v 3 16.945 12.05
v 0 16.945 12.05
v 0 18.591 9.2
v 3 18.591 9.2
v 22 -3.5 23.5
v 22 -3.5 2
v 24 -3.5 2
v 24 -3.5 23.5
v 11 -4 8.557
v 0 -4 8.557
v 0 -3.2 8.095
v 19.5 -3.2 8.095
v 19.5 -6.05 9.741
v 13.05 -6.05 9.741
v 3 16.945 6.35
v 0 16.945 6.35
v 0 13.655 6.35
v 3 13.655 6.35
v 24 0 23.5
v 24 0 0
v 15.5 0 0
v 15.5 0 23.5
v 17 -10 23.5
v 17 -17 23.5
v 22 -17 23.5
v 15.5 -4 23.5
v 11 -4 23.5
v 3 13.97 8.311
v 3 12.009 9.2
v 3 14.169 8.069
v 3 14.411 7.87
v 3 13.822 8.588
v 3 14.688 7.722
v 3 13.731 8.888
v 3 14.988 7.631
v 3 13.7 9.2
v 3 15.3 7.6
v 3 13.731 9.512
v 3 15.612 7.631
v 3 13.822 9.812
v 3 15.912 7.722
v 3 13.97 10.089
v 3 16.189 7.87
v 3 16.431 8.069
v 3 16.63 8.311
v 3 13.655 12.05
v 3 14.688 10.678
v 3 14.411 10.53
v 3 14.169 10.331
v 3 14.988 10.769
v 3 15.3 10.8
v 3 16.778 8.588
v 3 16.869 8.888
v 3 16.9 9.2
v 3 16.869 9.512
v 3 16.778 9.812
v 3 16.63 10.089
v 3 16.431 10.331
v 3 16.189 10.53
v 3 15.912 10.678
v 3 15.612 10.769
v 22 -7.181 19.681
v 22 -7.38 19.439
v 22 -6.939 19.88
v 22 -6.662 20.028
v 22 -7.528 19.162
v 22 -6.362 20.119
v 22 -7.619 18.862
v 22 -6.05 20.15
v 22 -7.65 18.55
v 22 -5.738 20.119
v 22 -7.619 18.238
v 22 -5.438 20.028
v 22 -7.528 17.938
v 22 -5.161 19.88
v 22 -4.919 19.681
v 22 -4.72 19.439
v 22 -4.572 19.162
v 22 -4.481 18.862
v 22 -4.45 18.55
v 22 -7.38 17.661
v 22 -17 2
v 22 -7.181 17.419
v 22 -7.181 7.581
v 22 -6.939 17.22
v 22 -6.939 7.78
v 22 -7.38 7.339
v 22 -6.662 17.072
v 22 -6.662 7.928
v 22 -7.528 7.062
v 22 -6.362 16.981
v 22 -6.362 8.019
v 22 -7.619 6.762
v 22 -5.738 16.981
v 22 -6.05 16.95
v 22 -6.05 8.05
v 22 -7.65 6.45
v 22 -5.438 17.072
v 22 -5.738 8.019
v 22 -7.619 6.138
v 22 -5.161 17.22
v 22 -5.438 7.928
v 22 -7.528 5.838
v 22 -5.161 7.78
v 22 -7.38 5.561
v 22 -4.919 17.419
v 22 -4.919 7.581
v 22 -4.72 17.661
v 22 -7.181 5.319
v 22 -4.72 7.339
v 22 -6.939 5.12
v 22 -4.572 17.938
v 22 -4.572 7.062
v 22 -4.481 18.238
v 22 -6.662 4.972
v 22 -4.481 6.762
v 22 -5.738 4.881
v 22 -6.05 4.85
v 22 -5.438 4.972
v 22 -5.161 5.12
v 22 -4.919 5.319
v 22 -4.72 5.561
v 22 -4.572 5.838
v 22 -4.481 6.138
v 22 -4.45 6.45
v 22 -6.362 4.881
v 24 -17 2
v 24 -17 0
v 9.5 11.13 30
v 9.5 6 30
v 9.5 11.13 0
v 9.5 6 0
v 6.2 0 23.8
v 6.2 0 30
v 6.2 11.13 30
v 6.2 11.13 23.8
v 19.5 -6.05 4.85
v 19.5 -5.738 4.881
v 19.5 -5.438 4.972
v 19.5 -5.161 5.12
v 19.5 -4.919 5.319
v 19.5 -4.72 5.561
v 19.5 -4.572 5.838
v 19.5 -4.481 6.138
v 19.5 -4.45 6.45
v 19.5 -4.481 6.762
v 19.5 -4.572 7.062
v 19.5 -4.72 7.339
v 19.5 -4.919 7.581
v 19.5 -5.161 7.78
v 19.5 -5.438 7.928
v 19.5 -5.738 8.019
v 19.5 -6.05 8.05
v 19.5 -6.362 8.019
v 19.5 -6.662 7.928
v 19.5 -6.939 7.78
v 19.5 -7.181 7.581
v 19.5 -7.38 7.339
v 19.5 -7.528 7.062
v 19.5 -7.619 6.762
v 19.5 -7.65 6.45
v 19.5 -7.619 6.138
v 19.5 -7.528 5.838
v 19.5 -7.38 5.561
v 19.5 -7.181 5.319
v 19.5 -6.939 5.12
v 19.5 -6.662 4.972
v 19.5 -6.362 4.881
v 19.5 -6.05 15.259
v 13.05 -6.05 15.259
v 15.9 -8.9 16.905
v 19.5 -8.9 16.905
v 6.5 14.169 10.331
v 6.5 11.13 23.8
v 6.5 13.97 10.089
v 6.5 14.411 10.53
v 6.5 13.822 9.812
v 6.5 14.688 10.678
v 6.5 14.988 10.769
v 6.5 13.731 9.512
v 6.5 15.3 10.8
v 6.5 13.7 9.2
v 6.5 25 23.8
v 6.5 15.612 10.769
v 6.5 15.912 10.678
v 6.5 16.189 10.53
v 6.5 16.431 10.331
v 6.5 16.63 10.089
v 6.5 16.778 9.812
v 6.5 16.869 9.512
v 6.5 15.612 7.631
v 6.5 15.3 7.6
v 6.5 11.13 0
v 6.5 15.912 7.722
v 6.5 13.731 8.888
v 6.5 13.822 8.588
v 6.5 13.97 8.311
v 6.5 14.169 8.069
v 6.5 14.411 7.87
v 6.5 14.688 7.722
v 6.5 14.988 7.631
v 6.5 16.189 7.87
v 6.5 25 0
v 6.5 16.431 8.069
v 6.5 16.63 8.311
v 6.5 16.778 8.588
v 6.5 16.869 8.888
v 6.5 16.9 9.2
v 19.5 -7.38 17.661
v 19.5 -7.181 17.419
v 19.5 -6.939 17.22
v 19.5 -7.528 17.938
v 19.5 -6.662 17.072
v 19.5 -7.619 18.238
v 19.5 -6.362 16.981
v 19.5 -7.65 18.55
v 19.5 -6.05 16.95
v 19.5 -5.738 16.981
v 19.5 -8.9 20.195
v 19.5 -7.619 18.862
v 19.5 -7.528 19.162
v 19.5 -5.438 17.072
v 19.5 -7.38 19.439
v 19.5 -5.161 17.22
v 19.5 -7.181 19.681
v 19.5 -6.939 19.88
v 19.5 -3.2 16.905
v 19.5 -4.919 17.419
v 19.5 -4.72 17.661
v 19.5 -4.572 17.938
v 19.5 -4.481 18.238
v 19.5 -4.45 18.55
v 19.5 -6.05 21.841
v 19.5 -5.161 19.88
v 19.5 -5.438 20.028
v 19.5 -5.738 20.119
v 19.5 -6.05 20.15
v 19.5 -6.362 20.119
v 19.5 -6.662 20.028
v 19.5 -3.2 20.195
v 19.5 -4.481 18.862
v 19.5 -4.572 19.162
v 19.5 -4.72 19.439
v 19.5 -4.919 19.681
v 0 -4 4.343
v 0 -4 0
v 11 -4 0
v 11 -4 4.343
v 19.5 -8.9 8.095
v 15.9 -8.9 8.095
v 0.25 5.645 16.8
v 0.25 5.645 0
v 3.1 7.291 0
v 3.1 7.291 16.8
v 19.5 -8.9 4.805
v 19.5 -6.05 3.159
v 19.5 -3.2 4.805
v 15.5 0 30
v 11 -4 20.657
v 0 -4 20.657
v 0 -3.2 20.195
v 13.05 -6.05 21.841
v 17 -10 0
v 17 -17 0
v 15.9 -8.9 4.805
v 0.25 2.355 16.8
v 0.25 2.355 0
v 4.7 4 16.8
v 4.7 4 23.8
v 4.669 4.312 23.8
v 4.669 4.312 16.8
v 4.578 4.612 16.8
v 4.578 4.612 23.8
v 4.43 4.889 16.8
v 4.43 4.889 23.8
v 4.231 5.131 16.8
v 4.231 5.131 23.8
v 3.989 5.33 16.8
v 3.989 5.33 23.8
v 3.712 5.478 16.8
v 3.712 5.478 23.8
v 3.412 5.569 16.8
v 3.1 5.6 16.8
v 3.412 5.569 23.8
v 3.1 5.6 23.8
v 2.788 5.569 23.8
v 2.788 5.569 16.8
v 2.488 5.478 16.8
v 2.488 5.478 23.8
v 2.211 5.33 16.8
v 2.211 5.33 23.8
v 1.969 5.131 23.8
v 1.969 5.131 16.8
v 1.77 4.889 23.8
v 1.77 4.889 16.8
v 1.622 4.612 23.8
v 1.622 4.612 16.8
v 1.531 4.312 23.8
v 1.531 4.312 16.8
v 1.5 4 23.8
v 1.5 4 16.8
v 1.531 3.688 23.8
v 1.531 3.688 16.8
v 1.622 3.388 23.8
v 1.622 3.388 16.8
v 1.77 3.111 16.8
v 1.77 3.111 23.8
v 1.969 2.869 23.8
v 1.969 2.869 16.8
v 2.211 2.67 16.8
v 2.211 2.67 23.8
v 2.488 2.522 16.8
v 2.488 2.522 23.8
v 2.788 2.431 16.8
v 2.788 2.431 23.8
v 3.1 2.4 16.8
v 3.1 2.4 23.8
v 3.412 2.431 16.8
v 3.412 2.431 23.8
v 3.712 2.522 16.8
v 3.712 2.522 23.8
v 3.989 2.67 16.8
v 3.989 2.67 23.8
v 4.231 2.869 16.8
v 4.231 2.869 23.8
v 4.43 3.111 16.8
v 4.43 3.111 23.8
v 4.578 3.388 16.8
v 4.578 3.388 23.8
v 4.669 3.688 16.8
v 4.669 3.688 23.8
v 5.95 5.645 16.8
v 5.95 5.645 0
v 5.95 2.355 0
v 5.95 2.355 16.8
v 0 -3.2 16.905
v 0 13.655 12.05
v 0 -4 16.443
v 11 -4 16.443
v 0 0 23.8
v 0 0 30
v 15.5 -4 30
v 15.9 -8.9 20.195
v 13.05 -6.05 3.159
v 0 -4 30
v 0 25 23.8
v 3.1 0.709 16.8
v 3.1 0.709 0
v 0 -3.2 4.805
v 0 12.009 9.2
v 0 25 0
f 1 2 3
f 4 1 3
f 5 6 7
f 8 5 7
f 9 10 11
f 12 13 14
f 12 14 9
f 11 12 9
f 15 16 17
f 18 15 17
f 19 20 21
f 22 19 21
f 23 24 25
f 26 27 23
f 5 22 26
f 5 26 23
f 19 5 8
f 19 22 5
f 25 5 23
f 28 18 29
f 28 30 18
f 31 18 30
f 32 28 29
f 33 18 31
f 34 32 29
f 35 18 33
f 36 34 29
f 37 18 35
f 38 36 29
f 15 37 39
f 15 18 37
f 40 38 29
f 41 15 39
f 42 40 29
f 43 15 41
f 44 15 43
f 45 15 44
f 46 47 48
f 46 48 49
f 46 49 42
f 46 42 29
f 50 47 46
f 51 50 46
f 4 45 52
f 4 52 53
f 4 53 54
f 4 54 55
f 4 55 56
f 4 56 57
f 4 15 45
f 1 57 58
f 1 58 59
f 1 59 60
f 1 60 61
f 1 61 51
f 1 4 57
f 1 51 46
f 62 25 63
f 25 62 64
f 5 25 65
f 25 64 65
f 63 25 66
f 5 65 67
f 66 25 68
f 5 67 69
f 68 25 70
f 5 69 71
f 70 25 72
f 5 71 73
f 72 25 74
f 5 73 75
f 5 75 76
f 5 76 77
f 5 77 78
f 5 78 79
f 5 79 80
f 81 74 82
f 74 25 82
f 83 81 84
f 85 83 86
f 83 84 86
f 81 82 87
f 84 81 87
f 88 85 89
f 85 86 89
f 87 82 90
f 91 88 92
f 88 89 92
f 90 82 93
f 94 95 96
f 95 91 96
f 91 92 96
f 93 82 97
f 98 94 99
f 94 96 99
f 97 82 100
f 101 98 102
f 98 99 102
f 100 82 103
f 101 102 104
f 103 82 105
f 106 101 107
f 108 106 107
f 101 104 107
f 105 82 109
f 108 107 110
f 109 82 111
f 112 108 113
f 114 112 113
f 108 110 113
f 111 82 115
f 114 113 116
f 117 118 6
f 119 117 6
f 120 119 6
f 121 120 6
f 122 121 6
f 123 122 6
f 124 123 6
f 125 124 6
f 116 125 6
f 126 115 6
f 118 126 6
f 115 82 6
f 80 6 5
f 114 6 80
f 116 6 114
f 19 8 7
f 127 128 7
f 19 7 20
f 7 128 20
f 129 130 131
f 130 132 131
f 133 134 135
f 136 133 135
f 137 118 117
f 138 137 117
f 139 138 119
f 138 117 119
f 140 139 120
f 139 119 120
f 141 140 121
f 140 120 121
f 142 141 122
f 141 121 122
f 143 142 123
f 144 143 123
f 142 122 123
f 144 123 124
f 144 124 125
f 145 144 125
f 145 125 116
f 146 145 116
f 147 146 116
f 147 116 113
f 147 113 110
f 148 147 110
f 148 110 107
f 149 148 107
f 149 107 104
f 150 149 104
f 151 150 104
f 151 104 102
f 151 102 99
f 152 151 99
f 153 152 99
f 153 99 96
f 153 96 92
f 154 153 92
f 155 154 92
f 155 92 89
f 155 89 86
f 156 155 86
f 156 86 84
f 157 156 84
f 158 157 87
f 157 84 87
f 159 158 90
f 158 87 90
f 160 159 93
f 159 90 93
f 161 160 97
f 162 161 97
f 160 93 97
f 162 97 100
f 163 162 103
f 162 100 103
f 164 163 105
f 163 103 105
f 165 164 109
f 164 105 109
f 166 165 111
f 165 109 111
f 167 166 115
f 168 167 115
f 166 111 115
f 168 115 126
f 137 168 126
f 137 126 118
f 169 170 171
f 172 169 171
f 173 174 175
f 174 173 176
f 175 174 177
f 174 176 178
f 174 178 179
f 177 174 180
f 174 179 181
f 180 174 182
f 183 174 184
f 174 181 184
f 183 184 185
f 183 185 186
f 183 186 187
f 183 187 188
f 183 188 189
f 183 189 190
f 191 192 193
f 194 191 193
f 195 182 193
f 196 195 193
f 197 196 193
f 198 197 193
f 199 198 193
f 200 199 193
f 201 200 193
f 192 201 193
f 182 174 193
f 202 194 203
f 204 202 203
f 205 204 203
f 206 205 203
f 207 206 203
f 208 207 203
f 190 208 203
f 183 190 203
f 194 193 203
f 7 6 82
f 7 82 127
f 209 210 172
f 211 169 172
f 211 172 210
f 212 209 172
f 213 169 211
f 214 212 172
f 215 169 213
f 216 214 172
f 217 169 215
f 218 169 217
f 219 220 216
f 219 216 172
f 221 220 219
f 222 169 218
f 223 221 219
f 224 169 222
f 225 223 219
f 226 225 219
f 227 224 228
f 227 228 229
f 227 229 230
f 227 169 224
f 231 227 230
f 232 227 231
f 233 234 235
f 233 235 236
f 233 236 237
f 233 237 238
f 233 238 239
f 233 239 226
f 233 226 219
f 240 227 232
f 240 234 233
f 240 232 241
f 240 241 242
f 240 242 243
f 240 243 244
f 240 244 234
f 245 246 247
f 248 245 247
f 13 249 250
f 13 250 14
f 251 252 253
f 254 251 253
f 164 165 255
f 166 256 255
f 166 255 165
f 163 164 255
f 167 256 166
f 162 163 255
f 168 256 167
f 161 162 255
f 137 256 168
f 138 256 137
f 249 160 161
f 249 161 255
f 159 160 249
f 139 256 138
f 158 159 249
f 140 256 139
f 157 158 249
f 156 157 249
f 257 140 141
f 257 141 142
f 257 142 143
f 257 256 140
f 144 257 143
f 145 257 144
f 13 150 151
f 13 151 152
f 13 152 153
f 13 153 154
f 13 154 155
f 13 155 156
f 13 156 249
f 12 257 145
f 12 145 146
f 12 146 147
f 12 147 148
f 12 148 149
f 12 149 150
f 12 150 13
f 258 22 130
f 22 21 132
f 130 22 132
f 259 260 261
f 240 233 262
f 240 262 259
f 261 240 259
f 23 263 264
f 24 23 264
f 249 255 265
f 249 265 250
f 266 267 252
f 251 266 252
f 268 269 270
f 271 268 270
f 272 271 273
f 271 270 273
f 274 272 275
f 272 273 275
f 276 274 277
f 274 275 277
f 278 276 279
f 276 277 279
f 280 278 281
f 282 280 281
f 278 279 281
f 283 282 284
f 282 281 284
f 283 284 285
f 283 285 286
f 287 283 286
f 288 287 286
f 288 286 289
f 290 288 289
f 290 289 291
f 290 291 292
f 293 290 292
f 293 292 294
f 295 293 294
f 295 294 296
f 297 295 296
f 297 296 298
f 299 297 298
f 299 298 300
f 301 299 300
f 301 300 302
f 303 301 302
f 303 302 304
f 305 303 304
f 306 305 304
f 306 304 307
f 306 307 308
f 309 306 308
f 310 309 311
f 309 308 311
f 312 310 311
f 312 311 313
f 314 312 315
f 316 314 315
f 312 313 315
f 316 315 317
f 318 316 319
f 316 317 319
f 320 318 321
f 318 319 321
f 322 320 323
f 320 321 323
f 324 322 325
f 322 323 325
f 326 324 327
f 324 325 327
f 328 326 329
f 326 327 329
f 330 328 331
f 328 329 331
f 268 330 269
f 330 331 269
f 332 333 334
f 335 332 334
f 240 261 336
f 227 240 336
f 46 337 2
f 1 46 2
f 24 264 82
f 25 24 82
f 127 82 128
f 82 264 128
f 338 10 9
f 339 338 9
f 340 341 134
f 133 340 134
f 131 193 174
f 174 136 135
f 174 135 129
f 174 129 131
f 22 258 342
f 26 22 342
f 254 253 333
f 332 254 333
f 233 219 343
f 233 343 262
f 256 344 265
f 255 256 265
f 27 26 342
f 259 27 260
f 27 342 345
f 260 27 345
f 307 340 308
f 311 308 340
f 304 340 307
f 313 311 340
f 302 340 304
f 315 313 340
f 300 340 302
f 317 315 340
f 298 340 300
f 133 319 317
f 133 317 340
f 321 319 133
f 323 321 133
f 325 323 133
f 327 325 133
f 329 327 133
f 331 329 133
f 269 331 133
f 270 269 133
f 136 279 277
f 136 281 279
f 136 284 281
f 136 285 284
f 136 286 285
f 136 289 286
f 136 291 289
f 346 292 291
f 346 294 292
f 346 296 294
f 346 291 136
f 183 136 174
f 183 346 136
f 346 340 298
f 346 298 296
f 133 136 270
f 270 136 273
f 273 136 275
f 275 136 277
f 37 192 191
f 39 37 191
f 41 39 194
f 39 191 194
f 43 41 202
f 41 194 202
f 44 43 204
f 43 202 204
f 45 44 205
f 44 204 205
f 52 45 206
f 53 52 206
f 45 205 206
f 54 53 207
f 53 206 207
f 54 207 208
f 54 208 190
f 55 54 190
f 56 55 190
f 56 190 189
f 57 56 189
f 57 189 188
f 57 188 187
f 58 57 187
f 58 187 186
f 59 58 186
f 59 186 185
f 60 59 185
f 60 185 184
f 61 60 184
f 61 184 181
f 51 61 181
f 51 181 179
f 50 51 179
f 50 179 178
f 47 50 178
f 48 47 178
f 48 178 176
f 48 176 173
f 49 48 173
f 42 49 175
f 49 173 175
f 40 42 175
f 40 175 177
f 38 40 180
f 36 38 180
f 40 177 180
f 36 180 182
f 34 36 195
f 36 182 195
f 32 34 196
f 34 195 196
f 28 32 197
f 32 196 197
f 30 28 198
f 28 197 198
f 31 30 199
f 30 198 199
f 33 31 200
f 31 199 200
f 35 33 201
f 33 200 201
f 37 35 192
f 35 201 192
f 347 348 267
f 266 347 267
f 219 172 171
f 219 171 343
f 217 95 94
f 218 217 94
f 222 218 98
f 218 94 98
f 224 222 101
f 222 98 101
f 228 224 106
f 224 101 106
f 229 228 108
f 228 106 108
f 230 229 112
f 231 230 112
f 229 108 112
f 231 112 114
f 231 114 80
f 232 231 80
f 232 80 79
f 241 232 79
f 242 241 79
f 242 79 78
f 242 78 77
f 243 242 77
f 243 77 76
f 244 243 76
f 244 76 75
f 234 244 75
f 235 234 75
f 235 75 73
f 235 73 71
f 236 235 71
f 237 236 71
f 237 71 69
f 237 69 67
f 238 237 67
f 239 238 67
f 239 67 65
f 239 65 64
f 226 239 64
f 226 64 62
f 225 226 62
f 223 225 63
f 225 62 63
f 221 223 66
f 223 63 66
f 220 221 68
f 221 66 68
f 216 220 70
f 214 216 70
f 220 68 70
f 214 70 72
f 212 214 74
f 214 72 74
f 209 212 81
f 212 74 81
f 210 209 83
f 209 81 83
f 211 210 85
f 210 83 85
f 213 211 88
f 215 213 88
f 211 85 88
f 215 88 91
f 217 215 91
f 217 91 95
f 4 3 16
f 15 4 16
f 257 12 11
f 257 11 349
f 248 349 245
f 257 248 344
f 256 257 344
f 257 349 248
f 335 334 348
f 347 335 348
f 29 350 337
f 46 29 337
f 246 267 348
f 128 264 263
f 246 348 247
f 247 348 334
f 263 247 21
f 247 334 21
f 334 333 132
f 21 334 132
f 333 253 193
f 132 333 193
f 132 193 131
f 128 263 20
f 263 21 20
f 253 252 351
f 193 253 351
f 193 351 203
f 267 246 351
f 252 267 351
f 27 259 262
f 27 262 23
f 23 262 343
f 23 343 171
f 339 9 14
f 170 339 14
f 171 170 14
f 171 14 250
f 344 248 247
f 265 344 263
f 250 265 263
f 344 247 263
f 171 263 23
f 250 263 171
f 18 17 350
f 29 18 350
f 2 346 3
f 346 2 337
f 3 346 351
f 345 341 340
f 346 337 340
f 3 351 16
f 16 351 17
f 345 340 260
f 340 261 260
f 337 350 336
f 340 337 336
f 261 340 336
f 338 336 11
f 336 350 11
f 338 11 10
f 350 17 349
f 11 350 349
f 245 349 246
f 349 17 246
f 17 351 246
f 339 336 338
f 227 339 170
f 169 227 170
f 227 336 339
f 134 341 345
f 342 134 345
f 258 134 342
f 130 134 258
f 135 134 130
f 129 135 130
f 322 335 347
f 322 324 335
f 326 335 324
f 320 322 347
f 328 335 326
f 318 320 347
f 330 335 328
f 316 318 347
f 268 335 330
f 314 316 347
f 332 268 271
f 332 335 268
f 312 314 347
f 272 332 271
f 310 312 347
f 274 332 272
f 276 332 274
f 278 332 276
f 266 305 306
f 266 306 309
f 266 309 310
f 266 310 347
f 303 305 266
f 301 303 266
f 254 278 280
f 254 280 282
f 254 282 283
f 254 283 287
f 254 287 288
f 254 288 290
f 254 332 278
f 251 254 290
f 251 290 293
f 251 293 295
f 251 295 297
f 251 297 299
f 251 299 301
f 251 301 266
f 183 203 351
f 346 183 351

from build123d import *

# Parameters (mm, degrees)
SALIENTE_EXTRUIR1_DEPTH           = 2
SALIENTE_EXTRUIR4_DEPTH           = 28
CROQUIS6_W                        = 6.2
CROQUIS6_H                        = 25
CORTAR_EXTRUIR2_DEPTH             = 6.2
CORTAR_EXTRUIR3_REACH             = 24
CROQUIS7_R                        = 1.6
CORTAR_EXTRUIR4_REACH             = 25.8
CROQUIS8_R                        = 1.6
CORTAR_EXTRUIR5_DEPTH             = 16.8
CORTAR_EXTRUIR6_DEPTH             = 2.5
CORTAR_EXTRUIR6_DIRECTION_2_REACH = 19
CROQUIS11_W                       = 0.3
CROQUIS11_H                       = 13.87
CORTAR_EXTRUIR7_DEPTH             = 6.2
CORTAR_EXTRUIR8_REACH             = 8.5
CROQUIS12_R                       = 1.6
CORTAR_EXTRUIR9_DEPTH             = 3
CORTAR_EXTRUIR10_DEPTH            = 6.5


with BuildPart() as part:
    # Croquis1 → Saliente-Extruir1 (new body)
    with BuildSketch(Plane.XY):
        Polygon((0, 0), (0, -4), (11, -4), (17, -10), (17, -17), (24, -17), (24, 0), (15.5, 0), (9.5, 6), (9.5, 11.13), (6.5, 11.13), (6.5, 25), (0, 25), align=None)
    extrude(amount=SALIENTE_EXTRUIR1_DEPTH)

    # Croquis5 → Saliente-Extruir4 (add)
    with BuildSketch(Plane.XY.offset(2)):
        Polygon((22, -17), (22, -3.5), (24, -3.5), (24, 0), (15.5, 0), (9.5, 6), (9.5, 11.13), (6.5, 11.13), (6.5, 25), (0, 25), (0, -4), (11, -4), (17, -10), (17, -17), align=None)
    extrude(amount=SALIENTE_EXTRUIR4_DEPTH)

    # Croquis6 → Cortar-Extruir2 (cut)
    with BuildSketch(Plane.XY.offset(30)):
        with Locations((3.1, 12.5)):
            Rectangle(CROQUIS6_W, CROQUIS6_H)
    extrude(amount=-CORTAR_EXTRUIR2_DEPTH, mode=Mode.SUBTRACT)

    # Croquis7 → Cortar-Extruir3 (cut, up to next)
    with BuildSketch(Plane(origin=(22, 0, 0), x_dir=(0, 0, -1), z_dir=(1, 0, 0)), mode=Mode.PRIVATE) as cortar_extruir3_sk1:
        with Locations((-18.55, -6.05)):
            Circle(CROQUIS7_R)
    cortar_extruir3_tool1 = extrude(cortar_extruir3_sk1.sketch, amount=-CORTAR_EXTRUIR3_REACH, mode=Mode.PRIVATE) & part.part
    add(cortar_extruir3_tool1.solids().sort_by_distance((22, -6.05, 18.55))[0], mode=Mode.SUBTRACT)
    # Croquis7 → Cortar-Extruir3 (cut, up to next)
    with BuildSketch(Plane(origin=(22, 0, 0), x_dir=(0, 0, -1), z_dir=(1, 0, 0)), mode=Mode.PRIVATE) as cortar_extruir3_sk2:
        with Locations((-6.45, -6.05)):
            Circle(CROQUIS7_R)
    cortar_extruir3_tool2 = extrude(cortar_extruir3_sk2.sketch, amount=-CORTAR_EXTRUIR3_REACH, mode=Mode.PRIVATE) & part.part
    add(cortar_extruir3_tool2.solids().sort_by_distance((22, -6.05, 6.45))[0], mode=Mode.SUBTRACT)

    # Croquis8 → Cortar-Extruir4 (cut, up to next)
    with BuildSketch(Plane.XY.offset(23.8), mode=Mode.PRIVATE) as cortar_extruir4_sk1:
        with Locations((3.1, 4)):
            Circle(CROQUIS8_R)
    cortar_extruir4_tool1 = extrude(cortar_extruir4_sk1.sketch, amount=-CORTAR_EXTRUIR4_REACH, mode=Mode.PRIVATE) & part.part
    add(cortar_extruir4_tool1.solids().sort_by_distance((3.1, 4, 23.8))[0], mode=Mode.SUBTRACT)

    # Croquis9 → Cortar-Extruir5 (cut)
    with BuildSketch(Plane(origin=(0, 0, 0), x_dir=(-1, 0, 0), z_dir=(0, 0, -1))):
        Polygon((-5.95, 2.354551733), (-3.1, 0.709103466), (-0.25, 2.354551733), (-0.25, 5.645448267), (-3.1, 7.290896534), (-5.95, 5.645448267), align=None)
    extrude(amount=-CORTAR_EXTRUIR5_DEPTH, mode=Mode.SUBTRACT)

    # Croquis10 → Cortar-Extruir6 (cut)
    with BuildSketch(Plane.ZY.offset(-17)):
        Polygon((3.159103466, -6.05), (4.804551733, -8.9), (8.095448267, -8.9), (9.740896534, -6.05), (8.095448267, -3.2), (4.804551733, -3.2), align=None)
        Polygon((15.259103466, -6.05), (16.904551733, -8.9), (20.195448267, -8.9), (21.840896534, -6.05), (20.195448267, -3.2), (16.904551733, -3.2), align=None)
    extrude(amount=-CORTAR_EXTRUIR6_DEPTH, mode=Mode.SUBTRACT)

    # Croquis10 → Cortar-Extruir6 direction 2 (cut, up to next)
    with BuildSketch(Plane.ZY.offset(-17), mode=Mode.PRIVATE) as cortar_extruir6_direction_2_sk1:
        Polygon((3.159103466, -6.05), (4.804551733, -8.9), (8.095448267, -8.9), (9.740896534, -6.05), (8.095448267, -3.2), (4.804551733, -3.2), align=None)
    cortar_extruir6_direction_2_tool1 = extrude(cortar_extruir6_direction_2_sk1.sketch, amount=CORTAR_EXTRUIR6_DIRECTION_2_REACH, mode=Mode.PRIVATE) & part.part
    add(cortar_extruir6_direction_2_tool1.solids().sort_by_distance((17, -6.05, 6.45))[0], mode=Mode.SUBTRACT)
    # Croquis10 → Cortar-Extruir6 direction 2 (cut, up to next)
    with BuildSketch(Plane.ZY.offset(-17), mode=Mode.PRIVATE) as cortar_extruir6_direction_2_sk2:
        Polygon((15.259103466, -6.05), (16.904551733, -8.9), (20.195448267, -8.9), (21.840896534, -6.05), (20.195448267, -3.2), (16.904551733, -3.2), align=None)
    cortar_extruir6_direction_2_tool2 = extrude(cortar_extruir6_direction_2_sk2.sketch, amount=CORTAR_EXTRUIR6_DIRECTION_2_REACH, mode=Mode.PRIVATE) & part.part
    add(cortar_extruir6_direction_2_tool2.solids().sort_by_distance((17, -6.05, 18.55))[0], mode=Mode.SUBTRACT)

    # Croquis11 → Cortar-Extruir7 (cut)
    with BuildSketch(Plane.XY.offset(30)):
        with Locations((6.35, 18.065)):
            Rectangle(CROQUIS11_W, CROQUIS11_H)
    extrude(amount=-CORTAR_EXTRUIR7_DEPTH, mode=Mode.SUBTRACT)

    # Croquis12 → Cortar-Extruir8 (cut, up to next)
    with BuildSketch(Plane(origin=(6.5, 0, 0), x_dir=(0, 0, -1), z_dir=(1, 0, 0)), mode=Mode.PRIVATE) as cortar_extruir8_sk1:
        with Locations((-9.2, 15.3)):
            Circle(CROQUIS12_R)
    cortar_extruir8_tool1 = extrude(cortar_extruir8_sk1.sketch, amount=-CORTAR_EXTRUIR8_REACH, mode=Mode.PRIVATE) & part.part
    add(cortar_extruir8_tool1.solids().sort_by_distance((6.5, 15.3, 9.2))[0], mode=Mode.SUBTRACT)

    # Croquis13 → Cortar-Extruir9 (cut)
    with BuildSketch(Plane.ZY):
        Polygon((9.2, 18.590896534), (6.35, 16.945448267), (6.35, 13.654551733), (9.2, 12.009103466), (12.05, 13.654551733), (12.05, 16.945448267), align=None)
    extrude(amount=-CORTAR_EXTRUIR9_DEPTH, mode=Mode.SUBTRACT)

    # Croquis14 → Cortar-Extruir10 (cut)
    with BuildSketch(Plane.XY.offset(30)):
        Polygon((15.5, 0), (15.5, -4), (11, -4), (17, -10), (17, -17), (22, -17), (22, -3.5), (24, -3.5), (24, 0), align=None)
    extrude(amount=-CORTAR_EXTRUIR10_DEPTH, mode=Mode.SUBTRACT)


solid = part.part
